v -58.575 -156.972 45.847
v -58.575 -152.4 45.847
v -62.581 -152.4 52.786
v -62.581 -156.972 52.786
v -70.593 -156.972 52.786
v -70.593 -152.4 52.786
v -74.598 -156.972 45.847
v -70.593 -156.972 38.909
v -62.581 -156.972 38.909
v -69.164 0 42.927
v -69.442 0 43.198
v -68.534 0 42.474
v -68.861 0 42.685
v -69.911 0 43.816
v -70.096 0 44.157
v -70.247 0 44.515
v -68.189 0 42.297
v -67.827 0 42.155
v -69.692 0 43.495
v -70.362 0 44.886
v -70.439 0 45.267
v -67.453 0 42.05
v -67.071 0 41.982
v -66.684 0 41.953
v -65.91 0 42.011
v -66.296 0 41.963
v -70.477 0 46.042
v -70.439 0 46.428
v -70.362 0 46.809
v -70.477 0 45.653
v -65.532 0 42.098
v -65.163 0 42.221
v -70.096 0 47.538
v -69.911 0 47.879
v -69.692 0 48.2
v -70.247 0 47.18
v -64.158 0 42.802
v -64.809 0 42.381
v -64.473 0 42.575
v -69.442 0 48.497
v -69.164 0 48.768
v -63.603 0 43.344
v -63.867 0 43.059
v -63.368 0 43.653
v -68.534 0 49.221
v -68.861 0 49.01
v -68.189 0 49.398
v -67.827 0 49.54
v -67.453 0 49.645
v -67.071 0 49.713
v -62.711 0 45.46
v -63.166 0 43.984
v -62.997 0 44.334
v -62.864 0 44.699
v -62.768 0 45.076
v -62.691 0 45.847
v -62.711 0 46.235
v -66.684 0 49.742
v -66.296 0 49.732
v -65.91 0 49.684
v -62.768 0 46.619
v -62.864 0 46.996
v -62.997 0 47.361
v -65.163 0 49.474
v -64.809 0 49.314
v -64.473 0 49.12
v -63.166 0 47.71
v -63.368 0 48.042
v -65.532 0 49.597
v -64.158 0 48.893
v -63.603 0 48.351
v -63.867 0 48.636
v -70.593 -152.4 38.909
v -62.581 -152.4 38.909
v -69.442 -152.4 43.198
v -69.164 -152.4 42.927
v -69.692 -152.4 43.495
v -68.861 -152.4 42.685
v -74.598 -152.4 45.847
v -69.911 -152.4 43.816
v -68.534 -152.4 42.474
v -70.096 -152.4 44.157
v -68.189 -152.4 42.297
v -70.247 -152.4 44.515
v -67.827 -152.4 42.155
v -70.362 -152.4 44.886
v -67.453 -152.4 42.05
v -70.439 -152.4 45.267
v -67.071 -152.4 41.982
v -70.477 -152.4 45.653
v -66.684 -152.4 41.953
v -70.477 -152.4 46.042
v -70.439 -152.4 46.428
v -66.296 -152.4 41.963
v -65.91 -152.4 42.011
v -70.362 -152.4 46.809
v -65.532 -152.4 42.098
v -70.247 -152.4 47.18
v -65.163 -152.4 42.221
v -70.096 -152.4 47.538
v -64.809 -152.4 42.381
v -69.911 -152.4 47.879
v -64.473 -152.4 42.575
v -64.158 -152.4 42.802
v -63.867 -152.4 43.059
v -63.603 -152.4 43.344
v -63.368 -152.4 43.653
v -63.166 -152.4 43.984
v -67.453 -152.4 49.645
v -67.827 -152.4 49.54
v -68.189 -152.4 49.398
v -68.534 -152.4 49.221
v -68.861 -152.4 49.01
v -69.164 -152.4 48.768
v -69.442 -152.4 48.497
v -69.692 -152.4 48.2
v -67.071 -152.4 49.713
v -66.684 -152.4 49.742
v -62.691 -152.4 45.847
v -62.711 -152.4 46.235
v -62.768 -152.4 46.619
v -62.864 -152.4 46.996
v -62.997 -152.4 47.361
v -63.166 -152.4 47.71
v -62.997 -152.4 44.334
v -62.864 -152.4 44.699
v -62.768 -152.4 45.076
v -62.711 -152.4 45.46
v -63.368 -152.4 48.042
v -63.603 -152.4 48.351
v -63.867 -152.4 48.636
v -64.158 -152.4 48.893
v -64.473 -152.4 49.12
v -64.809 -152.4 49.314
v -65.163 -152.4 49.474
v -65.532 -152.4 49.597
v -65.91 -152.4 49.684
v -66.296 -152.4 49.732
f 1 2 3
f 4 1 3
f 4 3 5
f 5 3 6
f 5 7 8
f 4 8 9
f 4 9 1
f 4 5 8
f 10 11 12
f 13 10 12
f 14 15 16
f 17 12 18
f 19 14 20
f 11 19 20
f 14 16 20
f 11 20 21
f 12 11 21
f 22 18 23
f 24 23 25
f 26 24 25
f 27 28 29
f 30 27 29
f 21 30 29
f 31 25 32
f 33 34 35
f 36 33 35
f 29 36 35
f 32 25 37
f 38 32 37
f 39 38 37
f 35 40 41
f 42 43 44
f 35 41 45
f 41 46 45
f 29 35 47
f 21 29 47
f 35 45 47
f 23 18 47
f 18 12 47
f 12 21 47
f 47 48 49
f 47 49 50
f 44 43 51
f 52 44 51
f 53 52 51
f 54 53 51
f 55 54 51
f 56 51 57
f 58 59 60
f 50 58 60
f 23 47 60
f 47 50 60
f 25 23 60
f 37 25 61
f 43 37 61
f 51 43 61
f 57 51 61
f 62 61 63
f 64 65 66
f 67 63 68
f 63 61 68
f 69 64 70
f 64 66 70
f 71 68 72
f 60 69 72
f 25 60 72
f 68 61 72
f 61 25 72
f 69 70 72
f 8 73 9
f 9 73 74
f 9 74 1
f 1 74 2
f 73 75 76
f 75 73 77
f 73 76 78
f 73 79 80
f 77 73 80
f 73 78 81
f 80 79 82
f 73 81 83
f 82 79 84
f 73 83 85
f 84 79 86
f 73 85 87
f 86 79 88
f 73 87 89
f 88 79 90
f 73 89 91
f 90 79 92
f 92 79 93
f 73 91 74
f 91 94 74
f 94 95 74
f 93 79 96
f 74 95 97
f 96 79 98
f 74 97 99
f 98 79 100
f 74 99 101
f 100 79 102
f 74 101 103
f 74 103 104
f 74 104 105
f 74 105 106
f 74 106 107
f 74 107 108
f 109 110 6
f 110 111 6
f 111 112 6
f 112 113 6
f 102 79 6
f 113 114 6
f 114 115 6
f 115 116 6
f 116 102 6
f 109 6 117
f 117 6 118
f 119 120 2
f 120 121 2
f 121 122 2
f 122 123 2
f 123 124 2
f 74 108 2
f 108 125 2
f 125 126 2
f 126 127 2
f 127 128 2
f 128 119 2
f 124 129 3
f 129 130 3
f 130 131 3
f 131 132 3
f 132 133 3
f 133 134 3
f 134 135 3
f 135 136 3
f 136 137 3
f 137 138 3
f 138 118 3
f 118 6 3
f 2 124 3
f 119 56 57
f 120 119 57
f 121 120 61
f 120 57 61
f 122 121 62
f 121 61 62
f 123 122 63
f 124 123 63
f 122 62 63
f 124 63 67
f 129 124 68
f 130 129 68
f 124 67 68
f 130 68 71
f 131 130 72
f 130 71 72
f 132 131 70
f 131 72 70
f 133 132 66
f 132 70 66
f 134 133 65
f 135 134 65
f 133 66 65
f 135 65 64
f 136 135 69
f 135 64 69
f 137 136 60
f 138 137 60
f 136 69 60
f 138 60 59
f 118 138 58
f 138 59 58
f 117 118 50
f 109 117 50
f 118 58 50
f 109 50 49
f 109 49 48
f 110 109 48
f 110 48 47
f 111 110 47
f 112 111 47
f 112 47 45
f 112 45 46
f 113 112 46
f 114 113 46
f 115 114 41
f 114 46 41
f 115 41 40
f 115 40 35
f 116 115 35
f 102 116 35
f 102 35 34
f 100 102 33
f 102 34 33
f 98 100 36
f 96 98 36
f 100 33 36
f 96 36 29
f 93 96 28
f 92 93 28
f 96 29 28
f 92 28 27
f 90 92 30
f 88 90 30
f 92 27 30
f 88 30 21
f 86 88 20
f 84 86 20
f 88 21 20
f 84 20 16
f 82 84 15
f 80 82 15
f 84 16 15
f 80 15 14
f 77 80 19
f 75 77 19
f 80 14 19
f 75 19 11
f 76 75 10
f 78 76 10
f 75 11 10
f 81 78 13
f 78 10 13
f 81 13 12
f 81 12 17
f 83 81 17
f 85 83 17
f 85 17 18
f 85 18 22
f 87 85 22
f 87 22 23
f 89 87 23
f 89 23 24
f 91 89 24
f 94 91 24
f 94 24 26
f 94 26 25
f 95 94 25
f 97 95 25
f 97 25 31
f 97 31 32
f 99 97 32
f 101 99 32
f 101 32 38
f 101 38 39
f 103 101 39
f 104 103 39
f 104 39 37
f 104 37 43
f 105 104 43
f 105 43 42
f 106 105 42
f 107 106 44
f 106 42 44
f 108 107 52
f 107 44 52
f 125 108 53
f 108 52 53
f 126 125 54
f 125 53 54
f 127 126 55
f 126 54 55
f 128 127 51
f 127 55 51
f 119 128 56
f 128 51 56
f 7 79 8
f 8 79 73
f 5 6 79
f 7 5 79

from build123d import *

# Parameters (mm, degrees)
F0_R     = 3.895446
F1_DEPTH = 152.4
F5_DEPTH = 4.572


with BuildPart() as f1:
    # F0 (on Front) → F1 (new body)
    with BuildSketch(Plane.XZ):
        with Locations((-66.586629, 45.847487)):
            Circle(F0_R)
    extrude(amount=F1_DEPTH)

    # F2 (on face) → F5 (join)
    with BuildSketch(Plane.XZ.offset(152.4)):
        Polygon((-70.592547, 38.909033), (-62.58071, 38.909033), (-58.574792, 45.847487), (-62.58071, 52.78594), (-70.592547, 52.78594), (-74.598465, 45.847487), align=None)
    extrude(amount=F5_DEPTH)


with BuildPart() as f3_1:
    # F3: copy of F1
    add(f1.part.moved(Location((-51.054, 57.15, -154.94))))


solid = f1.part
